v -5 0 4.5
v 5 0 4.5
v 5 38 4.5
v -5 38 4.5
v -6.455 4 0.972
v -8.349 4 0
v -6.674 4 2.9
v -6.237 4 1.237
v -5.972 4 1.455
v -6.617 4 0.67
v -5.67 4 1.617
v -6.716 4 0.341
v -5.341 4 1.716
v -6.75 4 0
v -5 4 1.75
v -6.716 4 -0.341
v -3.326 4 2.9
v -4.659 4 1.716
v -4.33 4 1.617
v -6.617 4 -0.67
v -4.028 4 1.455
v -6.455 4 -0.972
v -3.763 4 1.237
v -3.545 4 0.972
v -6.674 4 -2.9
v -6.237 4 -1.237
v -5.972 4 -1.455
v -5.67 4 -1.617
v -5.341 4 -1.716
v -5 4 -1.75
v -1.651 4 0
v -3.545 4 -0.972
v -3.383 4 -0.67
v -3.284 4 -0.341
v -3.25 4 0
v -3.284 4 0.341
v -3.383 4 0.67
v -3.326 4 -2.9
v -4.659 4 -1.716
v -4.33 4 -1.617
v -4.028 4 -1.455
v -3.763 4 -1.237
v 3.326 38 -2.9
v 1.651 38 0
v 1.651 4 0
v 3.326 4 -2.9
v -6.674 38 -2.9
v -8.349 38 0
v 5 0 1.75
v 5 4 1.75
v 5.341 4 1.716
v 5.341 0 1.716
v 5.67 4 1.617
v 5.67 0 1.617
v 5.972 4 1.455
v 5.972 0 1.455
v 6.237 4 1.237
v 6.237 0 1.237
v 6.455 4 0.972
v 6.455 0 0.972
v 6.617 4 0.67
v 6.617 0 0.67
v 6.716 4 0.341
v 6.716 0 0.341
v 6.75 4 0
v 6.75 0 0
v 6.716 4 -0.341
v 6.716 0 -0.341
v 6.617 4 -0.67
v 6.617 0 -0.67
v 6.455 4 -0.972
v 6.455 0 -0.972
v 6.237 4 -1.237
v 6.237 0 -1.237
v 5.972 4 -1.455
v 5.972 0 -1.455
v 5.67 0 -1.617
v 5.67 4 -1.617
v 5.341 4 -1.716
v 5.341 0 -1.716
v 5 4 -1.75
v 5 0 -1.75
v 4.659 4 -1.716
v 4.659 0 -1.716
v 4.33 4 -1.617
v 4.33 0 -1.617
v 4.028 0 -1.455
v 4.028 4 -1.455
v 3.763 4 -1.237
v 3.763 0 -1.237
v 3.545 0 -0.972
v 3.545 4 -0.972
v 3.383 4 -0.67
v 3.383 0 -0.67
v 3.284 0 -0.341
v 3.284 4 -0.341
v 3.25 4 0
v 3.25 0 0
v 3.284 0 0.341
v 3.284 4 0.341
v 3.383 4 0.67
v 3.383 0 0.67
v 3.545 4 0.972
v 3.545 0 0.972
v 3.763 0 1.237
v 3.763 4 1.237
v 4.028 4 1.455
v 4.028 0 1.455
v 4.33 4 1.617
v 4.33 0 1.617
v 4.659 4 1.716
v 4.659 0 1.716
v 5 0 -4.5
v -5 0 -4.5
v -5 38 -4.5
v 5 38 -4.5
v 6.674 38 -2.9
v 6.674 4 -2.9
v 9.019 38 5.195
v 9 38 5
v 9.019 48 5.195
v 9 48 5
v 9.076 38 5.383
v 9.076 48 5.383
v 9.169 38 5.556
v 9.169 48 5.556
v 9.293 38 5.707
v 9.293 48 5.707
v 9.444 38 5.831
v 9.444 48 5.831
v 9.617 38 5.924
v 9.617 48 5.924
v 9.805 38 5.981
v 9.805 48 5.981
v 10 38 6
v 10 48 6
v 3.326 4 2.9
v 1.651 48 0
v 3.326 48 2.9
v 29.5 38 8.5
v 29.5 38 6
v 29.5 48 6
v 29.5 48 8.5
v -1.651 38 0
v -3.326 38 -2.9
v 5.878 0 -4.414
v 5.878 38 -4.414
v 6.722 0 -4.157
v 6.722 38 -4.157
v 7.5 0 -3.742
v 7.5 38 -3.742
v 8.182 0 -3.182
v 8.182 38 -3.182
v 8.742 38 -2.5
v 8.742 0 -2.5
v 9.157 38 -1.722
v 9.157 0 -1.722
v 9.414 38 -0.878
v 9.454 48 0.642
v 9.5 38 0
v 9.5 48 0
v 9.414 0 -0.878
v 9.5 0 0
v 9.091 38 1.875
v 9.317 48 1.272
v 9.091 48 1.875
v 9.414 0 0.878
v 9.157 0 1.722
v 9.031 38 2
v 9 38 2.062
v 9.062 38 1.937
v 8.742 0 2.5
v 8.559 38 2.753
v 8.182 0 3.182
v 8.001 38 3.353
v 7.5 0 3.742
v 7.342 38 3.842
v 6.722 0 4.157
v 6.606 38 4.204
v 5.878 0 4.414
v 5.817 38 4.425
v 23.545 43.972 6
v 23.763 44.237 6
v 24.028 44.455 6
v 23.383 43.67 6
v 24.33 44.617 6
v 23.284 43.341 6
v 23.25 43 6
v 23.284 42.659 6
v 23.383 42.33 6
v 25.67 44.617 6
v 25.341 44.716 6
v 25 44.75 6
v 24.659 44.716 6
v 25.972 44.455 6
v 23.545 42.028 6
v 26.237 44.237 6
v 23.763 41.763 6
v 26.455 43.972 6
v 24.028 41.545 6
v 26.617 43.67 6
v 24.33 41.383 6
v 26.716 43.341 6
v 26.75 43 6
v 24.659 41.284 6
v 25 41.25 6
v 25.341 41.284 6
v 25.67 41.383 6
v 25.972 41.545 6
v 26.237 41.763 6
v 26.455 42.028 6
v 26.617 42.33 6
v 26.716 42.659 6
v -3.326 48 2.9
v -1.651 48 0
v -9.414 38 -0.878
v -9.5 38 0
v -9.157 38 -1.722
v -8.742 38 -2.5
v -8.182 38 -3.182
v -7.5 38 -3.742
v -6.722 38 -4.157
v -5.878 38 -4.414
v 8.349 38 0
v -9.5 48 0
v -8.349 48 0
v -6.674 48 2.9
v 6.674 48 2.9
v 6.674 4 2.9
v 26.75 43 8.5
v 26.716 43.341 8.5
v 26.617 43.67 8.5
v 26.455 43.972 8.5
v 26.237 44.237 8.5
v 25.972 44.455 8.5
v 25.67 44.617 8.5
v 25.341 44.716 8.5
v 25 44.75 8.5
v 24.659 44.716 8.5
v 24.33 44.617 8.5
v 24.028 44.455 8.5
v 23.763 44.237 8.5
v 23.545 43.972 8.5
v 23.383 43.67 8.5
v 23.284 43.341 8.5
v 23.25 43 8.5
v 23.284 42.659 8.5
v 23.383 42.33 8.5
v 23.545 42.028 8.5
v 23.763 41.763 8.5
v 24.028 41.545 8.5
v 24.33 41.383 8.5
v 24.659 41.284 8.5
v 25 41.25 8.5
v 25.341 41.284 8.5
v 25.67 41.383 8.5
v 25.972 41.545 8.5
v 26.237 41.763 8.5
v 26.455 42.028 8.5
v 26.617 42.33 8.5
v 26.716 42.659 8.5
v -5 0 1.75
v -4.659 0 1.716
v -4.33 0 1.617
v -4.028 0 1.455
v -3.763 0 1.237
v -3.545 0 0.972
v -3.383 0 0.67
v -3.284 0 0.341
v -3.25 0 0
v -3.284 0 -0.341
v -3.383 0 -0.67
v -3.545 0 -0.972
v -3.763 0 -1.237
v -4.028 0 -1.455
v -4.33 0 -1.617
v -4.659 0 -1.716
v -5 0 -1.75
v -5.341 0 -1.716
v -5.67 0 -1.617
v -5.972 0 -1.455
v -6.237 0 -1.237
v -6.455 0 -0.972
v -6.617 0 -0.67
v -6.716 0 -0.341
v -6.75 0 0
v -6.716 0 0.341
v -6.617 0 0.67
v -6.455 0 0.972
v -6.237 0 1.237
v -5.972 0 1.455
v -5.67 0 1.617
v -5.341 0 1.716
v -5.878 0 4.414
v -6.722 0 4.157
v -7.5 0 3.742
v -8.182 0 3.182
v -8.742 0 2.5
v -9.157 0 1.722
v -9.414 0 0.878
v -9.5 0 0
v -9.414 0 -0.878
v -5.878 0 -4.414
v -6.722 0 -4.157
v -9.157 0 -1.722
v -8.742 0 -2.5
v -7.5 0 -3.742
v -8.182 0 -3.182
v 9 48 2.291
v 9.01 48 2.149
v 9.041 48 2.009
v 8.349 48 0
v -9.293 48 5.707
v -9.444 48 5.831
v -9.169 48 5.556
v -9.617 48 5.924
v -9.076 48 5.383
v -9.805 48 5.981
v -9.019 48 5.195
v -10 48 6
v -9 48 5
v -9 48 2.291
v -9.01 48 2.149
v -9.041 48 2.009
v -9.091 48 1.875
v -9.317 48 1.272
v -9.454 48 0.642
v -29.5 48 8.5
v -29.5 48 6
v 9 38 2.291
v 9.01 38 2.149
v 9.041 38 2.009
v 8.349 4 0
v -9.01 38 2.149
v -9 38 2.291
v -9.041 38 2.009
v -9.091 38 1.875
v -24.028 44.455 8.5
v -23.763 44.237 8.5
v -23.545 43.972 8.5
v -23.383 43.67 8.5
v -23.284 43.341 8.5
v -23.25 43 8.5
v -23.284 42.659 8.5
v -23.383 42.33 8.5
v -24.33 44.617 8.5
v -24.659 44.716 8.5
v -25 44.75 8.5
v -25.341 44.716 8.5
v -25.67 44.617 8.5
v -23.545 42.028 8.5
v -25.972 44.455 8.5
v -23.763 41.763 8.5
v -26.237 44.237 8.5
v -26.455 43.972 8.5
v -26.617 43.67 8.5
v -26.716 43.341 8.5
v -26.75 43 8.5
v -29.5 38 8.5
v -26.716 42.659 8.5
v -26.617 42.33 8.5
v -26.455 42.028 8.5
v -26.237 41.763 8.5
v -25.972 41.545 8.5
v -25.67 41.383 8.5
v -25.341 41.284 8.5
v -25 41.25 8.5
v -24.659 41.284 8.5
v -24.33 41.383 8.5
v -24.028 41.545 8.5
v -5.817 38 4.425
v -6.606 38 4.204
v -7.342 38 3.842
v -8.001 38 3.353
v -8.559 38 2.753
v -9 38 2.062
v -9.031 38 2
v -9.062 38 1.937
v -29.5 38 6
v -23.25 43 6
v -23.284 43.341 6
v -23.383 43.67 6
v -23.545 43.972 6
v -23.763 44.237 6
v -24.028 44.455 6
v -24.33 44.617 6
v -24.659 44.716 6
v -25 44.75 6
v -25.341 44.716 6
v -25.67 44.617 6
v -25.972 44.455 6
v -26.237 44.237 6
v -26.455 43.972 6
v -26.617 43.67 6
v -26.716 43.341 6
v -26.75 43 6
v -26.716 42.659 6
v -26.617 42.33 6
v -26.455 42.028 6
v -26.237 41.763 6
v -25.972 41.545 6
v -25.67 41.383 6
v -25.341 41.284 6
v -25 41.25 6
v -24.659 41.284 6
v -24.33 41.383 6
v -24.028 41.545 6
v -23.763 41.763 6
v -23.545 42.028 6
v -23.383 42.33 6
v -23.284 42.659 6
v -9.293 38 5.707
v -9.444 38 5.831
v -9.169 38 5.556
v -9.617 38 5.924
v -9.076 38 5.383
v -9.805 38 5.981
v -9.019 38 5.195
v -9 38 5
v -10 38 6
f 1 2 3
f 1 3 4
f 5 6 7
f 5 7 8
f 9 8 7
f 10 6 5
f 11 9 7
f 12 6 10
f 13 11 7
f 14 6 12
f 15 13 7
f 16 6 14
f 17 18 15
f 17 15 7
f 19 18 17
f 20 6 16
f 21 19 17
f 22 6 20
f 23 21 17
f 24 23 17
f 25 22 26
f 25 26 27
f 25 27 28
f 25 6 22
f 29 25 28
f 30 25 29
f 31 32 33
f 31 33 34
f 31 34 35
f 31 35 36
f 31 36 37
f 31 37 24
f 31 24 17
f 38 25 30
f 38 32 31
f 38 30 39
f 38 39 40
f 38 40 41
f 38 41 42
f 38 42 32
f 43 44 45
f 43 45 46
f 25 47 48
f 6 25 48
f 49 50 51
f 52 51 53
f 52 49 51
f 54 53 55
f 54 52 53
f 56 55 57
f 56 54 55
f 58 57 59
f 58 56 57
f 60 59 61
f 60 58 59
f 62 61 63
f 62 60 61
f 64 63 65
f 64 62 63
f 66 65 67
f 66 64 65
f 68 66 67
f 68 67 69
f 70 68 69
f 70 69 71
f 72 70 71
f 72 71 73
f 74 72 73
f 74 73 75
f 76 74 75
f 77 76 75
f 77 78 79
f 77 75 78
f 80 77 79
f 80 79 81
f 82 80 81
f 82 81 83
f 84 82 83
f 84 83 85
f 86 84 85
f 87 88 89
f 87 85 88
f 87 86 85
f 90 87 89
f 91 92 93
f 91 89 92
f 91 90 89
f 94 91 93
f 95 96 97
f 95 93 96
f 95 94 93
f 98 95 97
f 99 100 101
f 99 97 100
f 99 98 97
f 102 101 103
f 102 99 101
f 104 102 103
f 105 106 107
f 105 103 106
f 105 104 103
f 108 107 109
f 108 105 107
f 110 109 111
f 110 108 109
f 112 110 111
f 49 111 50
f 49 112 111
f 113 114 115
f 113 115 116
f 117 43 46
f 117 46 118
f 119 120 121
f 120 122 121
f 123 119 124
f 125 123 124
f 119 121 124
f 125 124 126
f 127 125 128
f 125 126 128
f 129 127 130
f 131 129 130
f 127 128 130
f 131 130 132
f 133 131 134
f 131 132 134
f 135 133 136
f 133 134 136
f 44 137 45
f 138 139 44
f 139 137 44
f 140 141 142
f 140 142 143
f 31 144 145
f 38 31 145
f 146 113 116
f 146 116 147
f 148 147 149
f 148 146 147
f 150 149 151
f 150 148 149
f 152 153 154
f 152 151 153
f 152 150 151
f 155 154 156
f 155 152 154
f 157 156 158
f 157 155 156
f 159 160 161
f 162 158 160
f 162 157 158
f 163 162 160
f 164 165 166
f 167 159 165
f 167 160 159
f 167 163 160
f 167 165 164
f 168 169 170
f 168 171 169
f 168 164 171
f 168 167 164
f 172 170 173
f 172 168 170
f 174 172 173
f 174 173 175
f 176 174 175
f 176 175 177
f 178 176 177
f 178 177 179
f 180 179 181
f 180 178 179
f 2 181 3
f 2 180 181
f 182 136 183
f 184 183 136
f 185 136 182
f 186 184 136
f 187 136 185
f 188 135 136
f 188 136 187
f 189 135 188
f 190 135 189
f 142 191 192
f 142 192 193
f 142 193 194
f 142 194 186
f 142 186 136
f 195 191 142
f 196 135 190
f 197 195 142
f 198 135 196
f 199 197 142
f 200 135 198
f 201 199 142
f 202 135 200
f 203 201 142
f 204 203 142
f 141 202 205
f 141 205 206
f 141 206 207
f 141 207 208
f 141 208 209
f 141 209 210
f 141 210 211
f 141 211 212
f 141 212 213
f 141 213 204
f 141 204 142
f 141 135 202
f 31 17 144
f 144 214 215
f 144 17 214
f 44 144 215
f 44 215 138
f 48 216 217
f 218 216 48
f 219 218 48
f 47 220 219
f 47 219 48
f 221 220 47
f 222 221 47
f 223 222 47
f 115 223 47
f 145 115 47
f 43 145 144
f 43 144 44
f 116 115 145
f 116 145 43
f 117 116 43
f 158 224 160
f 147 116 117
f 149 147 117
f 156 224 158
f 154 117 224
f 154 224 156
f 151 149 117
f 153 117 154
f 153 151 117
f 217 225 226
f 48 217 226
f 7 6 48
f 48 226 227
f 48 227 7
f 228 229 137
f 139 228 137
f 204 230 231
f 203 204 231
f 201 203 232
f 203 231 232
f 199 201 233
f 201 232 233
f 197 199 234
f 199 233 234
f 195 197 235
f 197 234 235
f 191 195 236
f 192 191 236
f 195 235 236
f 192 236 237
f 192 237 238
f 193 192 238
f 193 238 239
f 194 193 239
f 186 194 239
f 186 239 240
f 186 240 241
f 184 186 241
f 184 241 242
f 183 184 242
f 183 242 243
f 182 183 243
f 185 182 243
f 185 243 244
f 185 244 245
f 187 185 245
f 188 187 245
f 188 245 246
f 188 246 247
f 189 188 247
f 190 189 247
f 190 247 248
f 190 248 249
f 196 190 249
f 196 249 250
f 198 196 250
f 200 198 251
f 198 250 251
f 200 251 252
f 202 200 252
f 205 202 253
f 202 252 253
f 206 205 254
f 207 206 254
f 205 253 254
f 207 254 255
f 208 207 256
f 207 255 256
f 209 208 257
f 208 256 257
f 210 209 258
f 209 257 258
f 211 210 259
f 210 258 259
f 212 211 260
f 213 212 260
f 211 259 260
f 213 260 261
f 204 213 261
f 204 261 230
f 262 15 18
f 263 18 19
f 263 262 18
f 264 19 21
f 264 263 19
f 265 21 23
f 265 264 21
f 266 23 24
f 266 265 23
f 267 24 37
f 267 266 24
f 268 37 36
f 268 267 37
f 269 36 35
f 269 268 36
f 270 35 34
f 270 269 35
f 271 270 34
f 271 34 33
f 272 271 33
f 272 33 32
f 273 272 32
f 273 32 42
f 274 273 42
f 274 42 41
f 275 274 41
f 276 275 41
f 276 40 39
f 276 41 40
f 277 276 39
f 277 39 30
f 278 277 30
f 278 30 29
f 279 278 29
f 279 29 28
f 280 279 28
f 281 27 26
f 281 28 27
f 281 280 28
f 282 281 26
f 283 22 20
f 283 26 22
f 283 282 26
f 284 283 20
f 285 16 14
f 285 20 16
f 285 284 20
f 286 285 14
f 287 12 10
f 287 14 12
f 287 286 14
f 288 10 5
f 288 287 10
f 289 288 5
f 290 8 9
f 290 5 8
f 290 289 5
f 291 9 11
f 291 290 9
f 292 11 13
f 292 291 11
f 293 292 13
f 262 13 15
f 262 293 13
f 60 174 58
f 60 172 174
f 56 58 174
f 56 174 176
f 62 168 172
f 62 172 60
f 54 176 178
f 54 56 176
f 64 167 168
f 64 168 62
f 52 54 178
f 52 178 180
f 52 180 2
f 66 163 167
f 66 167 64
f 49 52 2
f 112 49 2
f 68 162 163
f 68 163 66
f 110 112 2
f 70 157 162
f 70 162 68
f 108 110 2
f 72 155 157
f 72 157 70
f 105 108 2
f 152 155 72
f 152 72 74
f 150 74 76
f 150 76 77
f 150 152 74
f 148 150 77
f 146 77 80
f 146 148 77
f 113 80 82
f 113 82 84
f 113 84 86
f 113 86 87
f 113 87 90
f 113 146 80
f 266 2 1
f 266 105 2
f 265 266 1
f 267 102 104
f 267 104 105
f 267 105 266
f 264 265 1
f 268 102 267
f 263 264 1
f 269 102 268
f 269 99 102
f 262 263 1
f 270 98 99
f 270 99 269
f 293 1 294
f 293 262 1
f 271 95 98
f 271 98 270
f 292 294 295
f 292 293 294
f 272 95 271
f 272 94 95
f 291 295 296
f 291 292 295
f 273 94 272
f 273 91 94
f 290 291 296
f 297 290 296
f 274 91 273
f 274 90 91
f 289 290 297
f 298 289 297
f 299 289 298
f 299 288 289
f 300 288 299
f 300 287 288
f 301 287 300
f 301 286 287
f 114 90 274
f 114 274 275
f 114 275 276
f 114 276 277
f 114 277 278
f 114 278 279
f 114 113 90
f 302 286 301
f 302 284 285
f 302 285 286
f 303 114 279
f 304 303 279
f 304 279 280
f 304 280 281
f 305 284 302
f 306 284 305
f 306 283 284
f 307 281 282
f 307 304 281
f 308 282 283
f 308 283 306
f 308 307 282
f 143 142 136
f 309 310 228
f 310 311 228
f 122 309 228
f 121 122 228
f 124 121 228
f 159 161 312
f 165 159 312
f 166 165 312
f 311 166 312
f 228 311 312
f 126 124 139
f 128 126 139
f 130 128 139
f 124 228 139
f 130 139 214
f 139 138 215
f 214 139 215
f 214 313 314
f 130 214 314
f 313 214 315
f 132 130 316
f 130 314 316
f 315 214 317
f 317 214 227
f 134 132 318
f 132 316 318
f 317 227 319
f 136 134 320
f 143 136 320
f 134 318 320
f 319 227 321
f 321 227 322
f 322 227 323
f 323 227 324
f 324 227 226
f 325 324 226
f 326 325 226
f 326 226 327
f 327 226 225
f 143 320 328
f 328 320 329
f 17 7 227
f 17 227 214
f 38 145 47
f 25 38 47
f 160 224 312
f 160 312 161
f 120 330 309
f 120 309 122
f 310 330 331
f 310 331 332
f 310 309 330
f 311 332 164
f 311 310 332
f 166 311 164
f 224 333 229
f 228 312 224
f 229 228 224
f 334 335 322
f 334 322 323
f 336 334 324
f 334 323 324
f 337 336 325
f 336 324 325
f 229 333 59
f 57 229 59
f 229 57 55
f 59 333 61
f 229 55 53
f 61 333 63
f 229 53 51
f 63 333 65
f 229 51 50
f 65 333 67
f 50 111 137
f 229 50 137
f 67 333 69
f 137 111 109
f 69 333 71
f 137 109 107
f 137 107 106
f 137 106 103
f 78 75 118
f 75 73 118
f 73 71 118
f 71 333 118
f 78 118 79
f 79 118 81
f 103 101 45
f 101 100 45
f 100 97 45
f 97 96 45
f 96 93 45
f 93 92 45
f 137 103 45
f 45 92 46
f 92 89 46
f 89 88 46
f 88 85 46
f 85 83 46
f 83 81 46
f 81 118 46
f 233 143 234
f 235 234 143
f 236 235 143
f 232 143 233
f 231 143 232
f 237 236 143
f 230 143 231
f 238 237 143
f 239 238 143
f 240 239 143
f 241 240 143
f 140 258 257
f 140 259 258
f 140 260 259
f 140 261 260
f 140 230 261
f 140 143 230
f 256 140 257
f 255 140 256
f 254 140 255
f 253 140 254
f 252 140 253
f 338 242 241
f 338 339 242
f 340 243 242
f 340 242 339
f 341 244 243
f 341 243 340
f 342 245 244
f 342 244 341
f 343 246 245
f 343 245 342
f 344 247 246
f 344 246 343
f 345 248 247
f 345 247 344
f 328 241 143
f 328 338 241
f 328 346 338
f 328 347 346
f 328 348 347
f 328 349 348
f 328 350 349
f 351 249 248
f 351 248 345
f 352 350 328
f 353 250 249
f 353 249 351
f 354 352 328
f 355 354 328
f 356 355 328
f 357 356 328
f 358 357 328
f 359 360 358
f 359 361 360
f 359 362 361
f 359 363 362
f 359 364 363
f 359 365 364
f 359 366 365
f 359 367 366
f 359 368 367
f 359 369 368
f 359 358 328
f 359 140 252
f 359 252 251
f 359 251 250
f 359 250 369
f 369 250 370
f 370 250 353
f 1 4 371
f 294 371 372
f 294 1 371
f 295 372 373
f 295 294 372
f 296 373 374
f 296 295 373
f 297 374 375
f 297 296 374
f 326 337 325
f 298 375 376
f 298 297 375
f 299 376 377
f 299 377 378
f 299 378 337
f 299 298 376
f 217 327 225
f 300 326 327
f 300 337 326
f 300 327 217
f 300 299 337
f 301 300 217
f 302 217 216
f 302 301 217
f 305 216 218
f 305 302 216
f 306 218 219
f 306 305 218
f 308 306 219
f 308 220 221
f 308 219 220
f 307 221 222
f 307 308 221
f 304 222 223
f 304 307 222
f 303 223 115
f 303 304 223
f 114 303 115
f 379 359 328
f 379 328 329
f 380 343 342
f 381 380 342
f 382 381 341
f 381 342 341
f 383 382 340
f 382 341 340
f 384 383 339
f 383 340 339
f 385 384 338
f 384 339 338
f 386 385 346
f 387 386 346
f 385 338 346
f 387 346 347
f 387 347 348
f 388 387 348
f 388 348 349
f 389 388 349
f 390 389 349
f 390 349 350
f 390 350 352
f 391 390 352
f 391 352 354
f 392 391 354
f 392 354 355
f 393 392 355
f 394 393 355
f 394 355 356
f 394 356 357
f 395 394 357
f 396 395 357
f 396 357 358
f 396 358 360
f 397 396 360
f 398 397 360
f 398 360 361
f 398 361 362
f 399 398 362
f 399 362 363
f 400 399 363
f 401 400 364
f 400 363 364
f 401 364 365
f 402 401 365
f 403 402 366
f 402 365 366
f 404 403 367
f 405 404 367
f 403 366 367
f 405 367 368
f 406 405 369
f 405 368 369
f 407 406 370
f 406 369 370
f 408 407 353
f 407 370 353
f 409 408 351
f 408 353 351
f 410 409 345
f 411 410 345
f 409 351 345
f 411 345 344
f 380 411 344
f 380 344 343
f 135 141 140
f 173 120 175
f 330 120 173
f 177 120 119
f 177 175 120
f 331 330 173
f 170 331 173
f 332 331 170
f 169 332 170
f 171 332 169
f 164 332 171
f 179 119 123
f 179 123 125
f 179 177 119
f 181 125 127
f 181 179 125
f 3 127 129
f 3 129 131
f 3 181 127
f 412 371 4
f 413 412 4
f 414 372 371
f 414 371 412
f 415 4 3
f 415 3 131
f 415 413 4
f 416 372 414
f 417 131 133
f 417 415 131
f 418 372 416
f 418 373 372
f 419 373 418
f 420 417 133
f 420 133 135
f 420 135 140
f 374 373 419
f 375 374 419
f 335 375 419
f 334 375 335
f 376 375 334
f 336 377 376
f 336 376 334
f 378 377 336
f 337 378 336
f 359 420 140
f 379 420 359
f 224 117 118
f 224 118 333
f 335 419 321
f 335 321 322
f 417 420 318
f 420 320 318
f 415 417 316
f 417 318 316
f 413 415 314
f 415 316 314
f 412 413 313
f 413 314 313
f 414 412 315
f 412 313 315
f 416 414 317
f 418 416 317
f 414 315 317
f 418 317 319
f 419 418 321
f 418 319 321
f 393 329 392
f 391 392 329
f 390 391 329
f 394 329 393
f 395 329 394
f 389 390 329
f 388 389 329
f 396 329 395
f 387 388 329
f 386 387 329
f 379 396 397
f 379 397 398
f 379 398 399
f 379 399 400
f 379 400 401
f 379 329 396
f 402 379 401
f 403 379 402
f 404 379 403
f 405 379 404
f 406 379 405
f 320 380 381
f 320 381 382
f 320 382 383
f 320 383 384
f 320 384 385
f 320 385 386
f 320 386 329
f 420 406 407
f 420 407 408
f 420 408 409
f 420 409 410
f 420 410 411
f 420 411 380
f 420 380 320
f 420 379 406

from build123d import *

# Parameters (mm, degrees)
SKETCH1_R           = 1.75
BOSS_EXTRUDE1_DEPTH = 48
CUT_EXTRUDE1_DEPTH  = 44
BOSS_EXTRUDE2_START = -10
BOSS_EXTRUDE2_DEPTH = 10
CUT_EXTRUDE2_START  = -10
CUT_EXTRUDE2_DEPTH  = 10
FILLET3_R           = 1
SKETCH6_R           = 1.75
CUT_EXTRUDE3_DEPTH  = 10


with BuildPart() as part:
    # Sketch1 → Boss-Extrude1 (new body)
    with BuildSketch(Plane(origin=(0, 0, 0), x_dir=(1, 0, 0), z_dir=(0, 1, 0))):
        with BuildLine():
            Line((-5, 4.5), (5, 4.5))
            ThreePointArc((5, 4.5), (9.5, 0), (5, -4.5))
            Line((5, -4.5), (-5, -4.5))
            ThreePointArc((-5, -4.5), (-9.5, 0), (-5, 4.5))
        make_face()
        with Locations(Location((-5, 0, 0), (0, 0, 270))):
            Circle(SKETCH1_R, mode=Mode.SUBTRACT)
        with Locations(Location((5, 0, 0), (0, 0, 270))):
            Circle(SKETCH1_R, mode=Mode.SUBTRACT)
    extrude(amount=BOSS_EXTRUDE1_DEPTH)

    # Sketch2 → Cut-Extrude1 (cut)
    with BuildSketch(Plane(origin=(0, 48, 0), x_dir=(1, 0, 0), z_dir=(0, 1, 0))):
        Polygon((-1.651368439, 0), (-3.325684219, 2.9), (-6.674315781, 2.9), (-8.348631561, 0), (-6.674315781, -2.9), (-3.325684219, -2.9), align=None)
        Polygon((3.325684219, -2.9), (1.651368439, 0), (3.325684219, 2.9), (6.674315781, 2.9), (8.348631561, 0), (6.674315781, -2.9), align=None)
    extrude(amount=-CUT_EXTRUDE1_DEPTH, mode=Mode.SUBTRACT)

    # Sketch4 → Boss-Extrude2 (add)
    with BuildSketch(Plane(origin=(0, 48, 0), x_dir=(1, 0, 0), z_dir=(0, 1, 0)).offset(BOSS_EXTRUDE2_START)):
        with BuildLine():
            Line((-5, -4.5), (5, -4.5))
            ThreePointArc((5, -4.5), (7.342329219, -3.842329219), (9, -2.061552813))
            Line((9, -2.061552813), (9, -6))
            Line((9, -6), (29.5, -6))
            Line((29.5, -6), (29.5, -8.5))
            Line((29.5, -8.5), (10.5, -8.5))
            Line((10.5, -8.5), (-10.5, -8.5))
            Line((-10.5, -8.5), (-29.5, -8.5))
            Line((-29.5, -8.5), (-29.5, -6))
            Line((-29.5, -6), (-9, -6))
            Line((-9, -6), (-9, -2.061552813))
            ThreePointArc((-9, -2.061552813), (-7.342329219, -3.842329219), (-5, -4.5))
        make_face()
    extrude(amount=BOSS_EXTRUDE2_DEPTH)

    # Sketch5 → Cut-Extrude2 (cut)
    with BuildSketch(Plane(origin=(0, 48, 0), x_dir=(1, 0, 0), z_dir=(0, 1, 0)).offset(CUT_EXTRUDE2_START)):
        with BuildLine():
            Line((-9.5, 0), (9.5, 0))
            ThreePointArc((9.5, 0), (8.181980515, 3.181980515), (5, 4.5))
            Line((5, 4.5), (-5, 4.5))
            ThreePointArc((-5, 4.5), (-8.181980515, 3.181980515), (-9.5, 0))
        make_face()
    extrude(amount=CUT_EXTRUDE2_DEPTH, mode=Mode.SUBTRACT)

    # Fillet3
    fillet3_edges = [part.edges().sort_by_distance(p)[0] for p in [
        (-9, 43, 6),
        (-9, 43, 2.061552813),
        (9, 43, 2.061552813),
        (9, 43, 6),
    ]]
    fillet(fillet3_edges, radius=FILLET3_R)

    # Sketch6 → Cut-Extrude3 (cut)
    with BuildSketch(Plane.XY.offset(8.5)):
        with Locations((-25, 43)):
            Circle(SKETCH6_R)
        with Locations((25, 43)):
            Circle(SKETCH6_R)
    extrude(amount=-CUT_EXTRUDE3_DEPTH, mode=Mode.SUBTRACT)


solid = part.part
